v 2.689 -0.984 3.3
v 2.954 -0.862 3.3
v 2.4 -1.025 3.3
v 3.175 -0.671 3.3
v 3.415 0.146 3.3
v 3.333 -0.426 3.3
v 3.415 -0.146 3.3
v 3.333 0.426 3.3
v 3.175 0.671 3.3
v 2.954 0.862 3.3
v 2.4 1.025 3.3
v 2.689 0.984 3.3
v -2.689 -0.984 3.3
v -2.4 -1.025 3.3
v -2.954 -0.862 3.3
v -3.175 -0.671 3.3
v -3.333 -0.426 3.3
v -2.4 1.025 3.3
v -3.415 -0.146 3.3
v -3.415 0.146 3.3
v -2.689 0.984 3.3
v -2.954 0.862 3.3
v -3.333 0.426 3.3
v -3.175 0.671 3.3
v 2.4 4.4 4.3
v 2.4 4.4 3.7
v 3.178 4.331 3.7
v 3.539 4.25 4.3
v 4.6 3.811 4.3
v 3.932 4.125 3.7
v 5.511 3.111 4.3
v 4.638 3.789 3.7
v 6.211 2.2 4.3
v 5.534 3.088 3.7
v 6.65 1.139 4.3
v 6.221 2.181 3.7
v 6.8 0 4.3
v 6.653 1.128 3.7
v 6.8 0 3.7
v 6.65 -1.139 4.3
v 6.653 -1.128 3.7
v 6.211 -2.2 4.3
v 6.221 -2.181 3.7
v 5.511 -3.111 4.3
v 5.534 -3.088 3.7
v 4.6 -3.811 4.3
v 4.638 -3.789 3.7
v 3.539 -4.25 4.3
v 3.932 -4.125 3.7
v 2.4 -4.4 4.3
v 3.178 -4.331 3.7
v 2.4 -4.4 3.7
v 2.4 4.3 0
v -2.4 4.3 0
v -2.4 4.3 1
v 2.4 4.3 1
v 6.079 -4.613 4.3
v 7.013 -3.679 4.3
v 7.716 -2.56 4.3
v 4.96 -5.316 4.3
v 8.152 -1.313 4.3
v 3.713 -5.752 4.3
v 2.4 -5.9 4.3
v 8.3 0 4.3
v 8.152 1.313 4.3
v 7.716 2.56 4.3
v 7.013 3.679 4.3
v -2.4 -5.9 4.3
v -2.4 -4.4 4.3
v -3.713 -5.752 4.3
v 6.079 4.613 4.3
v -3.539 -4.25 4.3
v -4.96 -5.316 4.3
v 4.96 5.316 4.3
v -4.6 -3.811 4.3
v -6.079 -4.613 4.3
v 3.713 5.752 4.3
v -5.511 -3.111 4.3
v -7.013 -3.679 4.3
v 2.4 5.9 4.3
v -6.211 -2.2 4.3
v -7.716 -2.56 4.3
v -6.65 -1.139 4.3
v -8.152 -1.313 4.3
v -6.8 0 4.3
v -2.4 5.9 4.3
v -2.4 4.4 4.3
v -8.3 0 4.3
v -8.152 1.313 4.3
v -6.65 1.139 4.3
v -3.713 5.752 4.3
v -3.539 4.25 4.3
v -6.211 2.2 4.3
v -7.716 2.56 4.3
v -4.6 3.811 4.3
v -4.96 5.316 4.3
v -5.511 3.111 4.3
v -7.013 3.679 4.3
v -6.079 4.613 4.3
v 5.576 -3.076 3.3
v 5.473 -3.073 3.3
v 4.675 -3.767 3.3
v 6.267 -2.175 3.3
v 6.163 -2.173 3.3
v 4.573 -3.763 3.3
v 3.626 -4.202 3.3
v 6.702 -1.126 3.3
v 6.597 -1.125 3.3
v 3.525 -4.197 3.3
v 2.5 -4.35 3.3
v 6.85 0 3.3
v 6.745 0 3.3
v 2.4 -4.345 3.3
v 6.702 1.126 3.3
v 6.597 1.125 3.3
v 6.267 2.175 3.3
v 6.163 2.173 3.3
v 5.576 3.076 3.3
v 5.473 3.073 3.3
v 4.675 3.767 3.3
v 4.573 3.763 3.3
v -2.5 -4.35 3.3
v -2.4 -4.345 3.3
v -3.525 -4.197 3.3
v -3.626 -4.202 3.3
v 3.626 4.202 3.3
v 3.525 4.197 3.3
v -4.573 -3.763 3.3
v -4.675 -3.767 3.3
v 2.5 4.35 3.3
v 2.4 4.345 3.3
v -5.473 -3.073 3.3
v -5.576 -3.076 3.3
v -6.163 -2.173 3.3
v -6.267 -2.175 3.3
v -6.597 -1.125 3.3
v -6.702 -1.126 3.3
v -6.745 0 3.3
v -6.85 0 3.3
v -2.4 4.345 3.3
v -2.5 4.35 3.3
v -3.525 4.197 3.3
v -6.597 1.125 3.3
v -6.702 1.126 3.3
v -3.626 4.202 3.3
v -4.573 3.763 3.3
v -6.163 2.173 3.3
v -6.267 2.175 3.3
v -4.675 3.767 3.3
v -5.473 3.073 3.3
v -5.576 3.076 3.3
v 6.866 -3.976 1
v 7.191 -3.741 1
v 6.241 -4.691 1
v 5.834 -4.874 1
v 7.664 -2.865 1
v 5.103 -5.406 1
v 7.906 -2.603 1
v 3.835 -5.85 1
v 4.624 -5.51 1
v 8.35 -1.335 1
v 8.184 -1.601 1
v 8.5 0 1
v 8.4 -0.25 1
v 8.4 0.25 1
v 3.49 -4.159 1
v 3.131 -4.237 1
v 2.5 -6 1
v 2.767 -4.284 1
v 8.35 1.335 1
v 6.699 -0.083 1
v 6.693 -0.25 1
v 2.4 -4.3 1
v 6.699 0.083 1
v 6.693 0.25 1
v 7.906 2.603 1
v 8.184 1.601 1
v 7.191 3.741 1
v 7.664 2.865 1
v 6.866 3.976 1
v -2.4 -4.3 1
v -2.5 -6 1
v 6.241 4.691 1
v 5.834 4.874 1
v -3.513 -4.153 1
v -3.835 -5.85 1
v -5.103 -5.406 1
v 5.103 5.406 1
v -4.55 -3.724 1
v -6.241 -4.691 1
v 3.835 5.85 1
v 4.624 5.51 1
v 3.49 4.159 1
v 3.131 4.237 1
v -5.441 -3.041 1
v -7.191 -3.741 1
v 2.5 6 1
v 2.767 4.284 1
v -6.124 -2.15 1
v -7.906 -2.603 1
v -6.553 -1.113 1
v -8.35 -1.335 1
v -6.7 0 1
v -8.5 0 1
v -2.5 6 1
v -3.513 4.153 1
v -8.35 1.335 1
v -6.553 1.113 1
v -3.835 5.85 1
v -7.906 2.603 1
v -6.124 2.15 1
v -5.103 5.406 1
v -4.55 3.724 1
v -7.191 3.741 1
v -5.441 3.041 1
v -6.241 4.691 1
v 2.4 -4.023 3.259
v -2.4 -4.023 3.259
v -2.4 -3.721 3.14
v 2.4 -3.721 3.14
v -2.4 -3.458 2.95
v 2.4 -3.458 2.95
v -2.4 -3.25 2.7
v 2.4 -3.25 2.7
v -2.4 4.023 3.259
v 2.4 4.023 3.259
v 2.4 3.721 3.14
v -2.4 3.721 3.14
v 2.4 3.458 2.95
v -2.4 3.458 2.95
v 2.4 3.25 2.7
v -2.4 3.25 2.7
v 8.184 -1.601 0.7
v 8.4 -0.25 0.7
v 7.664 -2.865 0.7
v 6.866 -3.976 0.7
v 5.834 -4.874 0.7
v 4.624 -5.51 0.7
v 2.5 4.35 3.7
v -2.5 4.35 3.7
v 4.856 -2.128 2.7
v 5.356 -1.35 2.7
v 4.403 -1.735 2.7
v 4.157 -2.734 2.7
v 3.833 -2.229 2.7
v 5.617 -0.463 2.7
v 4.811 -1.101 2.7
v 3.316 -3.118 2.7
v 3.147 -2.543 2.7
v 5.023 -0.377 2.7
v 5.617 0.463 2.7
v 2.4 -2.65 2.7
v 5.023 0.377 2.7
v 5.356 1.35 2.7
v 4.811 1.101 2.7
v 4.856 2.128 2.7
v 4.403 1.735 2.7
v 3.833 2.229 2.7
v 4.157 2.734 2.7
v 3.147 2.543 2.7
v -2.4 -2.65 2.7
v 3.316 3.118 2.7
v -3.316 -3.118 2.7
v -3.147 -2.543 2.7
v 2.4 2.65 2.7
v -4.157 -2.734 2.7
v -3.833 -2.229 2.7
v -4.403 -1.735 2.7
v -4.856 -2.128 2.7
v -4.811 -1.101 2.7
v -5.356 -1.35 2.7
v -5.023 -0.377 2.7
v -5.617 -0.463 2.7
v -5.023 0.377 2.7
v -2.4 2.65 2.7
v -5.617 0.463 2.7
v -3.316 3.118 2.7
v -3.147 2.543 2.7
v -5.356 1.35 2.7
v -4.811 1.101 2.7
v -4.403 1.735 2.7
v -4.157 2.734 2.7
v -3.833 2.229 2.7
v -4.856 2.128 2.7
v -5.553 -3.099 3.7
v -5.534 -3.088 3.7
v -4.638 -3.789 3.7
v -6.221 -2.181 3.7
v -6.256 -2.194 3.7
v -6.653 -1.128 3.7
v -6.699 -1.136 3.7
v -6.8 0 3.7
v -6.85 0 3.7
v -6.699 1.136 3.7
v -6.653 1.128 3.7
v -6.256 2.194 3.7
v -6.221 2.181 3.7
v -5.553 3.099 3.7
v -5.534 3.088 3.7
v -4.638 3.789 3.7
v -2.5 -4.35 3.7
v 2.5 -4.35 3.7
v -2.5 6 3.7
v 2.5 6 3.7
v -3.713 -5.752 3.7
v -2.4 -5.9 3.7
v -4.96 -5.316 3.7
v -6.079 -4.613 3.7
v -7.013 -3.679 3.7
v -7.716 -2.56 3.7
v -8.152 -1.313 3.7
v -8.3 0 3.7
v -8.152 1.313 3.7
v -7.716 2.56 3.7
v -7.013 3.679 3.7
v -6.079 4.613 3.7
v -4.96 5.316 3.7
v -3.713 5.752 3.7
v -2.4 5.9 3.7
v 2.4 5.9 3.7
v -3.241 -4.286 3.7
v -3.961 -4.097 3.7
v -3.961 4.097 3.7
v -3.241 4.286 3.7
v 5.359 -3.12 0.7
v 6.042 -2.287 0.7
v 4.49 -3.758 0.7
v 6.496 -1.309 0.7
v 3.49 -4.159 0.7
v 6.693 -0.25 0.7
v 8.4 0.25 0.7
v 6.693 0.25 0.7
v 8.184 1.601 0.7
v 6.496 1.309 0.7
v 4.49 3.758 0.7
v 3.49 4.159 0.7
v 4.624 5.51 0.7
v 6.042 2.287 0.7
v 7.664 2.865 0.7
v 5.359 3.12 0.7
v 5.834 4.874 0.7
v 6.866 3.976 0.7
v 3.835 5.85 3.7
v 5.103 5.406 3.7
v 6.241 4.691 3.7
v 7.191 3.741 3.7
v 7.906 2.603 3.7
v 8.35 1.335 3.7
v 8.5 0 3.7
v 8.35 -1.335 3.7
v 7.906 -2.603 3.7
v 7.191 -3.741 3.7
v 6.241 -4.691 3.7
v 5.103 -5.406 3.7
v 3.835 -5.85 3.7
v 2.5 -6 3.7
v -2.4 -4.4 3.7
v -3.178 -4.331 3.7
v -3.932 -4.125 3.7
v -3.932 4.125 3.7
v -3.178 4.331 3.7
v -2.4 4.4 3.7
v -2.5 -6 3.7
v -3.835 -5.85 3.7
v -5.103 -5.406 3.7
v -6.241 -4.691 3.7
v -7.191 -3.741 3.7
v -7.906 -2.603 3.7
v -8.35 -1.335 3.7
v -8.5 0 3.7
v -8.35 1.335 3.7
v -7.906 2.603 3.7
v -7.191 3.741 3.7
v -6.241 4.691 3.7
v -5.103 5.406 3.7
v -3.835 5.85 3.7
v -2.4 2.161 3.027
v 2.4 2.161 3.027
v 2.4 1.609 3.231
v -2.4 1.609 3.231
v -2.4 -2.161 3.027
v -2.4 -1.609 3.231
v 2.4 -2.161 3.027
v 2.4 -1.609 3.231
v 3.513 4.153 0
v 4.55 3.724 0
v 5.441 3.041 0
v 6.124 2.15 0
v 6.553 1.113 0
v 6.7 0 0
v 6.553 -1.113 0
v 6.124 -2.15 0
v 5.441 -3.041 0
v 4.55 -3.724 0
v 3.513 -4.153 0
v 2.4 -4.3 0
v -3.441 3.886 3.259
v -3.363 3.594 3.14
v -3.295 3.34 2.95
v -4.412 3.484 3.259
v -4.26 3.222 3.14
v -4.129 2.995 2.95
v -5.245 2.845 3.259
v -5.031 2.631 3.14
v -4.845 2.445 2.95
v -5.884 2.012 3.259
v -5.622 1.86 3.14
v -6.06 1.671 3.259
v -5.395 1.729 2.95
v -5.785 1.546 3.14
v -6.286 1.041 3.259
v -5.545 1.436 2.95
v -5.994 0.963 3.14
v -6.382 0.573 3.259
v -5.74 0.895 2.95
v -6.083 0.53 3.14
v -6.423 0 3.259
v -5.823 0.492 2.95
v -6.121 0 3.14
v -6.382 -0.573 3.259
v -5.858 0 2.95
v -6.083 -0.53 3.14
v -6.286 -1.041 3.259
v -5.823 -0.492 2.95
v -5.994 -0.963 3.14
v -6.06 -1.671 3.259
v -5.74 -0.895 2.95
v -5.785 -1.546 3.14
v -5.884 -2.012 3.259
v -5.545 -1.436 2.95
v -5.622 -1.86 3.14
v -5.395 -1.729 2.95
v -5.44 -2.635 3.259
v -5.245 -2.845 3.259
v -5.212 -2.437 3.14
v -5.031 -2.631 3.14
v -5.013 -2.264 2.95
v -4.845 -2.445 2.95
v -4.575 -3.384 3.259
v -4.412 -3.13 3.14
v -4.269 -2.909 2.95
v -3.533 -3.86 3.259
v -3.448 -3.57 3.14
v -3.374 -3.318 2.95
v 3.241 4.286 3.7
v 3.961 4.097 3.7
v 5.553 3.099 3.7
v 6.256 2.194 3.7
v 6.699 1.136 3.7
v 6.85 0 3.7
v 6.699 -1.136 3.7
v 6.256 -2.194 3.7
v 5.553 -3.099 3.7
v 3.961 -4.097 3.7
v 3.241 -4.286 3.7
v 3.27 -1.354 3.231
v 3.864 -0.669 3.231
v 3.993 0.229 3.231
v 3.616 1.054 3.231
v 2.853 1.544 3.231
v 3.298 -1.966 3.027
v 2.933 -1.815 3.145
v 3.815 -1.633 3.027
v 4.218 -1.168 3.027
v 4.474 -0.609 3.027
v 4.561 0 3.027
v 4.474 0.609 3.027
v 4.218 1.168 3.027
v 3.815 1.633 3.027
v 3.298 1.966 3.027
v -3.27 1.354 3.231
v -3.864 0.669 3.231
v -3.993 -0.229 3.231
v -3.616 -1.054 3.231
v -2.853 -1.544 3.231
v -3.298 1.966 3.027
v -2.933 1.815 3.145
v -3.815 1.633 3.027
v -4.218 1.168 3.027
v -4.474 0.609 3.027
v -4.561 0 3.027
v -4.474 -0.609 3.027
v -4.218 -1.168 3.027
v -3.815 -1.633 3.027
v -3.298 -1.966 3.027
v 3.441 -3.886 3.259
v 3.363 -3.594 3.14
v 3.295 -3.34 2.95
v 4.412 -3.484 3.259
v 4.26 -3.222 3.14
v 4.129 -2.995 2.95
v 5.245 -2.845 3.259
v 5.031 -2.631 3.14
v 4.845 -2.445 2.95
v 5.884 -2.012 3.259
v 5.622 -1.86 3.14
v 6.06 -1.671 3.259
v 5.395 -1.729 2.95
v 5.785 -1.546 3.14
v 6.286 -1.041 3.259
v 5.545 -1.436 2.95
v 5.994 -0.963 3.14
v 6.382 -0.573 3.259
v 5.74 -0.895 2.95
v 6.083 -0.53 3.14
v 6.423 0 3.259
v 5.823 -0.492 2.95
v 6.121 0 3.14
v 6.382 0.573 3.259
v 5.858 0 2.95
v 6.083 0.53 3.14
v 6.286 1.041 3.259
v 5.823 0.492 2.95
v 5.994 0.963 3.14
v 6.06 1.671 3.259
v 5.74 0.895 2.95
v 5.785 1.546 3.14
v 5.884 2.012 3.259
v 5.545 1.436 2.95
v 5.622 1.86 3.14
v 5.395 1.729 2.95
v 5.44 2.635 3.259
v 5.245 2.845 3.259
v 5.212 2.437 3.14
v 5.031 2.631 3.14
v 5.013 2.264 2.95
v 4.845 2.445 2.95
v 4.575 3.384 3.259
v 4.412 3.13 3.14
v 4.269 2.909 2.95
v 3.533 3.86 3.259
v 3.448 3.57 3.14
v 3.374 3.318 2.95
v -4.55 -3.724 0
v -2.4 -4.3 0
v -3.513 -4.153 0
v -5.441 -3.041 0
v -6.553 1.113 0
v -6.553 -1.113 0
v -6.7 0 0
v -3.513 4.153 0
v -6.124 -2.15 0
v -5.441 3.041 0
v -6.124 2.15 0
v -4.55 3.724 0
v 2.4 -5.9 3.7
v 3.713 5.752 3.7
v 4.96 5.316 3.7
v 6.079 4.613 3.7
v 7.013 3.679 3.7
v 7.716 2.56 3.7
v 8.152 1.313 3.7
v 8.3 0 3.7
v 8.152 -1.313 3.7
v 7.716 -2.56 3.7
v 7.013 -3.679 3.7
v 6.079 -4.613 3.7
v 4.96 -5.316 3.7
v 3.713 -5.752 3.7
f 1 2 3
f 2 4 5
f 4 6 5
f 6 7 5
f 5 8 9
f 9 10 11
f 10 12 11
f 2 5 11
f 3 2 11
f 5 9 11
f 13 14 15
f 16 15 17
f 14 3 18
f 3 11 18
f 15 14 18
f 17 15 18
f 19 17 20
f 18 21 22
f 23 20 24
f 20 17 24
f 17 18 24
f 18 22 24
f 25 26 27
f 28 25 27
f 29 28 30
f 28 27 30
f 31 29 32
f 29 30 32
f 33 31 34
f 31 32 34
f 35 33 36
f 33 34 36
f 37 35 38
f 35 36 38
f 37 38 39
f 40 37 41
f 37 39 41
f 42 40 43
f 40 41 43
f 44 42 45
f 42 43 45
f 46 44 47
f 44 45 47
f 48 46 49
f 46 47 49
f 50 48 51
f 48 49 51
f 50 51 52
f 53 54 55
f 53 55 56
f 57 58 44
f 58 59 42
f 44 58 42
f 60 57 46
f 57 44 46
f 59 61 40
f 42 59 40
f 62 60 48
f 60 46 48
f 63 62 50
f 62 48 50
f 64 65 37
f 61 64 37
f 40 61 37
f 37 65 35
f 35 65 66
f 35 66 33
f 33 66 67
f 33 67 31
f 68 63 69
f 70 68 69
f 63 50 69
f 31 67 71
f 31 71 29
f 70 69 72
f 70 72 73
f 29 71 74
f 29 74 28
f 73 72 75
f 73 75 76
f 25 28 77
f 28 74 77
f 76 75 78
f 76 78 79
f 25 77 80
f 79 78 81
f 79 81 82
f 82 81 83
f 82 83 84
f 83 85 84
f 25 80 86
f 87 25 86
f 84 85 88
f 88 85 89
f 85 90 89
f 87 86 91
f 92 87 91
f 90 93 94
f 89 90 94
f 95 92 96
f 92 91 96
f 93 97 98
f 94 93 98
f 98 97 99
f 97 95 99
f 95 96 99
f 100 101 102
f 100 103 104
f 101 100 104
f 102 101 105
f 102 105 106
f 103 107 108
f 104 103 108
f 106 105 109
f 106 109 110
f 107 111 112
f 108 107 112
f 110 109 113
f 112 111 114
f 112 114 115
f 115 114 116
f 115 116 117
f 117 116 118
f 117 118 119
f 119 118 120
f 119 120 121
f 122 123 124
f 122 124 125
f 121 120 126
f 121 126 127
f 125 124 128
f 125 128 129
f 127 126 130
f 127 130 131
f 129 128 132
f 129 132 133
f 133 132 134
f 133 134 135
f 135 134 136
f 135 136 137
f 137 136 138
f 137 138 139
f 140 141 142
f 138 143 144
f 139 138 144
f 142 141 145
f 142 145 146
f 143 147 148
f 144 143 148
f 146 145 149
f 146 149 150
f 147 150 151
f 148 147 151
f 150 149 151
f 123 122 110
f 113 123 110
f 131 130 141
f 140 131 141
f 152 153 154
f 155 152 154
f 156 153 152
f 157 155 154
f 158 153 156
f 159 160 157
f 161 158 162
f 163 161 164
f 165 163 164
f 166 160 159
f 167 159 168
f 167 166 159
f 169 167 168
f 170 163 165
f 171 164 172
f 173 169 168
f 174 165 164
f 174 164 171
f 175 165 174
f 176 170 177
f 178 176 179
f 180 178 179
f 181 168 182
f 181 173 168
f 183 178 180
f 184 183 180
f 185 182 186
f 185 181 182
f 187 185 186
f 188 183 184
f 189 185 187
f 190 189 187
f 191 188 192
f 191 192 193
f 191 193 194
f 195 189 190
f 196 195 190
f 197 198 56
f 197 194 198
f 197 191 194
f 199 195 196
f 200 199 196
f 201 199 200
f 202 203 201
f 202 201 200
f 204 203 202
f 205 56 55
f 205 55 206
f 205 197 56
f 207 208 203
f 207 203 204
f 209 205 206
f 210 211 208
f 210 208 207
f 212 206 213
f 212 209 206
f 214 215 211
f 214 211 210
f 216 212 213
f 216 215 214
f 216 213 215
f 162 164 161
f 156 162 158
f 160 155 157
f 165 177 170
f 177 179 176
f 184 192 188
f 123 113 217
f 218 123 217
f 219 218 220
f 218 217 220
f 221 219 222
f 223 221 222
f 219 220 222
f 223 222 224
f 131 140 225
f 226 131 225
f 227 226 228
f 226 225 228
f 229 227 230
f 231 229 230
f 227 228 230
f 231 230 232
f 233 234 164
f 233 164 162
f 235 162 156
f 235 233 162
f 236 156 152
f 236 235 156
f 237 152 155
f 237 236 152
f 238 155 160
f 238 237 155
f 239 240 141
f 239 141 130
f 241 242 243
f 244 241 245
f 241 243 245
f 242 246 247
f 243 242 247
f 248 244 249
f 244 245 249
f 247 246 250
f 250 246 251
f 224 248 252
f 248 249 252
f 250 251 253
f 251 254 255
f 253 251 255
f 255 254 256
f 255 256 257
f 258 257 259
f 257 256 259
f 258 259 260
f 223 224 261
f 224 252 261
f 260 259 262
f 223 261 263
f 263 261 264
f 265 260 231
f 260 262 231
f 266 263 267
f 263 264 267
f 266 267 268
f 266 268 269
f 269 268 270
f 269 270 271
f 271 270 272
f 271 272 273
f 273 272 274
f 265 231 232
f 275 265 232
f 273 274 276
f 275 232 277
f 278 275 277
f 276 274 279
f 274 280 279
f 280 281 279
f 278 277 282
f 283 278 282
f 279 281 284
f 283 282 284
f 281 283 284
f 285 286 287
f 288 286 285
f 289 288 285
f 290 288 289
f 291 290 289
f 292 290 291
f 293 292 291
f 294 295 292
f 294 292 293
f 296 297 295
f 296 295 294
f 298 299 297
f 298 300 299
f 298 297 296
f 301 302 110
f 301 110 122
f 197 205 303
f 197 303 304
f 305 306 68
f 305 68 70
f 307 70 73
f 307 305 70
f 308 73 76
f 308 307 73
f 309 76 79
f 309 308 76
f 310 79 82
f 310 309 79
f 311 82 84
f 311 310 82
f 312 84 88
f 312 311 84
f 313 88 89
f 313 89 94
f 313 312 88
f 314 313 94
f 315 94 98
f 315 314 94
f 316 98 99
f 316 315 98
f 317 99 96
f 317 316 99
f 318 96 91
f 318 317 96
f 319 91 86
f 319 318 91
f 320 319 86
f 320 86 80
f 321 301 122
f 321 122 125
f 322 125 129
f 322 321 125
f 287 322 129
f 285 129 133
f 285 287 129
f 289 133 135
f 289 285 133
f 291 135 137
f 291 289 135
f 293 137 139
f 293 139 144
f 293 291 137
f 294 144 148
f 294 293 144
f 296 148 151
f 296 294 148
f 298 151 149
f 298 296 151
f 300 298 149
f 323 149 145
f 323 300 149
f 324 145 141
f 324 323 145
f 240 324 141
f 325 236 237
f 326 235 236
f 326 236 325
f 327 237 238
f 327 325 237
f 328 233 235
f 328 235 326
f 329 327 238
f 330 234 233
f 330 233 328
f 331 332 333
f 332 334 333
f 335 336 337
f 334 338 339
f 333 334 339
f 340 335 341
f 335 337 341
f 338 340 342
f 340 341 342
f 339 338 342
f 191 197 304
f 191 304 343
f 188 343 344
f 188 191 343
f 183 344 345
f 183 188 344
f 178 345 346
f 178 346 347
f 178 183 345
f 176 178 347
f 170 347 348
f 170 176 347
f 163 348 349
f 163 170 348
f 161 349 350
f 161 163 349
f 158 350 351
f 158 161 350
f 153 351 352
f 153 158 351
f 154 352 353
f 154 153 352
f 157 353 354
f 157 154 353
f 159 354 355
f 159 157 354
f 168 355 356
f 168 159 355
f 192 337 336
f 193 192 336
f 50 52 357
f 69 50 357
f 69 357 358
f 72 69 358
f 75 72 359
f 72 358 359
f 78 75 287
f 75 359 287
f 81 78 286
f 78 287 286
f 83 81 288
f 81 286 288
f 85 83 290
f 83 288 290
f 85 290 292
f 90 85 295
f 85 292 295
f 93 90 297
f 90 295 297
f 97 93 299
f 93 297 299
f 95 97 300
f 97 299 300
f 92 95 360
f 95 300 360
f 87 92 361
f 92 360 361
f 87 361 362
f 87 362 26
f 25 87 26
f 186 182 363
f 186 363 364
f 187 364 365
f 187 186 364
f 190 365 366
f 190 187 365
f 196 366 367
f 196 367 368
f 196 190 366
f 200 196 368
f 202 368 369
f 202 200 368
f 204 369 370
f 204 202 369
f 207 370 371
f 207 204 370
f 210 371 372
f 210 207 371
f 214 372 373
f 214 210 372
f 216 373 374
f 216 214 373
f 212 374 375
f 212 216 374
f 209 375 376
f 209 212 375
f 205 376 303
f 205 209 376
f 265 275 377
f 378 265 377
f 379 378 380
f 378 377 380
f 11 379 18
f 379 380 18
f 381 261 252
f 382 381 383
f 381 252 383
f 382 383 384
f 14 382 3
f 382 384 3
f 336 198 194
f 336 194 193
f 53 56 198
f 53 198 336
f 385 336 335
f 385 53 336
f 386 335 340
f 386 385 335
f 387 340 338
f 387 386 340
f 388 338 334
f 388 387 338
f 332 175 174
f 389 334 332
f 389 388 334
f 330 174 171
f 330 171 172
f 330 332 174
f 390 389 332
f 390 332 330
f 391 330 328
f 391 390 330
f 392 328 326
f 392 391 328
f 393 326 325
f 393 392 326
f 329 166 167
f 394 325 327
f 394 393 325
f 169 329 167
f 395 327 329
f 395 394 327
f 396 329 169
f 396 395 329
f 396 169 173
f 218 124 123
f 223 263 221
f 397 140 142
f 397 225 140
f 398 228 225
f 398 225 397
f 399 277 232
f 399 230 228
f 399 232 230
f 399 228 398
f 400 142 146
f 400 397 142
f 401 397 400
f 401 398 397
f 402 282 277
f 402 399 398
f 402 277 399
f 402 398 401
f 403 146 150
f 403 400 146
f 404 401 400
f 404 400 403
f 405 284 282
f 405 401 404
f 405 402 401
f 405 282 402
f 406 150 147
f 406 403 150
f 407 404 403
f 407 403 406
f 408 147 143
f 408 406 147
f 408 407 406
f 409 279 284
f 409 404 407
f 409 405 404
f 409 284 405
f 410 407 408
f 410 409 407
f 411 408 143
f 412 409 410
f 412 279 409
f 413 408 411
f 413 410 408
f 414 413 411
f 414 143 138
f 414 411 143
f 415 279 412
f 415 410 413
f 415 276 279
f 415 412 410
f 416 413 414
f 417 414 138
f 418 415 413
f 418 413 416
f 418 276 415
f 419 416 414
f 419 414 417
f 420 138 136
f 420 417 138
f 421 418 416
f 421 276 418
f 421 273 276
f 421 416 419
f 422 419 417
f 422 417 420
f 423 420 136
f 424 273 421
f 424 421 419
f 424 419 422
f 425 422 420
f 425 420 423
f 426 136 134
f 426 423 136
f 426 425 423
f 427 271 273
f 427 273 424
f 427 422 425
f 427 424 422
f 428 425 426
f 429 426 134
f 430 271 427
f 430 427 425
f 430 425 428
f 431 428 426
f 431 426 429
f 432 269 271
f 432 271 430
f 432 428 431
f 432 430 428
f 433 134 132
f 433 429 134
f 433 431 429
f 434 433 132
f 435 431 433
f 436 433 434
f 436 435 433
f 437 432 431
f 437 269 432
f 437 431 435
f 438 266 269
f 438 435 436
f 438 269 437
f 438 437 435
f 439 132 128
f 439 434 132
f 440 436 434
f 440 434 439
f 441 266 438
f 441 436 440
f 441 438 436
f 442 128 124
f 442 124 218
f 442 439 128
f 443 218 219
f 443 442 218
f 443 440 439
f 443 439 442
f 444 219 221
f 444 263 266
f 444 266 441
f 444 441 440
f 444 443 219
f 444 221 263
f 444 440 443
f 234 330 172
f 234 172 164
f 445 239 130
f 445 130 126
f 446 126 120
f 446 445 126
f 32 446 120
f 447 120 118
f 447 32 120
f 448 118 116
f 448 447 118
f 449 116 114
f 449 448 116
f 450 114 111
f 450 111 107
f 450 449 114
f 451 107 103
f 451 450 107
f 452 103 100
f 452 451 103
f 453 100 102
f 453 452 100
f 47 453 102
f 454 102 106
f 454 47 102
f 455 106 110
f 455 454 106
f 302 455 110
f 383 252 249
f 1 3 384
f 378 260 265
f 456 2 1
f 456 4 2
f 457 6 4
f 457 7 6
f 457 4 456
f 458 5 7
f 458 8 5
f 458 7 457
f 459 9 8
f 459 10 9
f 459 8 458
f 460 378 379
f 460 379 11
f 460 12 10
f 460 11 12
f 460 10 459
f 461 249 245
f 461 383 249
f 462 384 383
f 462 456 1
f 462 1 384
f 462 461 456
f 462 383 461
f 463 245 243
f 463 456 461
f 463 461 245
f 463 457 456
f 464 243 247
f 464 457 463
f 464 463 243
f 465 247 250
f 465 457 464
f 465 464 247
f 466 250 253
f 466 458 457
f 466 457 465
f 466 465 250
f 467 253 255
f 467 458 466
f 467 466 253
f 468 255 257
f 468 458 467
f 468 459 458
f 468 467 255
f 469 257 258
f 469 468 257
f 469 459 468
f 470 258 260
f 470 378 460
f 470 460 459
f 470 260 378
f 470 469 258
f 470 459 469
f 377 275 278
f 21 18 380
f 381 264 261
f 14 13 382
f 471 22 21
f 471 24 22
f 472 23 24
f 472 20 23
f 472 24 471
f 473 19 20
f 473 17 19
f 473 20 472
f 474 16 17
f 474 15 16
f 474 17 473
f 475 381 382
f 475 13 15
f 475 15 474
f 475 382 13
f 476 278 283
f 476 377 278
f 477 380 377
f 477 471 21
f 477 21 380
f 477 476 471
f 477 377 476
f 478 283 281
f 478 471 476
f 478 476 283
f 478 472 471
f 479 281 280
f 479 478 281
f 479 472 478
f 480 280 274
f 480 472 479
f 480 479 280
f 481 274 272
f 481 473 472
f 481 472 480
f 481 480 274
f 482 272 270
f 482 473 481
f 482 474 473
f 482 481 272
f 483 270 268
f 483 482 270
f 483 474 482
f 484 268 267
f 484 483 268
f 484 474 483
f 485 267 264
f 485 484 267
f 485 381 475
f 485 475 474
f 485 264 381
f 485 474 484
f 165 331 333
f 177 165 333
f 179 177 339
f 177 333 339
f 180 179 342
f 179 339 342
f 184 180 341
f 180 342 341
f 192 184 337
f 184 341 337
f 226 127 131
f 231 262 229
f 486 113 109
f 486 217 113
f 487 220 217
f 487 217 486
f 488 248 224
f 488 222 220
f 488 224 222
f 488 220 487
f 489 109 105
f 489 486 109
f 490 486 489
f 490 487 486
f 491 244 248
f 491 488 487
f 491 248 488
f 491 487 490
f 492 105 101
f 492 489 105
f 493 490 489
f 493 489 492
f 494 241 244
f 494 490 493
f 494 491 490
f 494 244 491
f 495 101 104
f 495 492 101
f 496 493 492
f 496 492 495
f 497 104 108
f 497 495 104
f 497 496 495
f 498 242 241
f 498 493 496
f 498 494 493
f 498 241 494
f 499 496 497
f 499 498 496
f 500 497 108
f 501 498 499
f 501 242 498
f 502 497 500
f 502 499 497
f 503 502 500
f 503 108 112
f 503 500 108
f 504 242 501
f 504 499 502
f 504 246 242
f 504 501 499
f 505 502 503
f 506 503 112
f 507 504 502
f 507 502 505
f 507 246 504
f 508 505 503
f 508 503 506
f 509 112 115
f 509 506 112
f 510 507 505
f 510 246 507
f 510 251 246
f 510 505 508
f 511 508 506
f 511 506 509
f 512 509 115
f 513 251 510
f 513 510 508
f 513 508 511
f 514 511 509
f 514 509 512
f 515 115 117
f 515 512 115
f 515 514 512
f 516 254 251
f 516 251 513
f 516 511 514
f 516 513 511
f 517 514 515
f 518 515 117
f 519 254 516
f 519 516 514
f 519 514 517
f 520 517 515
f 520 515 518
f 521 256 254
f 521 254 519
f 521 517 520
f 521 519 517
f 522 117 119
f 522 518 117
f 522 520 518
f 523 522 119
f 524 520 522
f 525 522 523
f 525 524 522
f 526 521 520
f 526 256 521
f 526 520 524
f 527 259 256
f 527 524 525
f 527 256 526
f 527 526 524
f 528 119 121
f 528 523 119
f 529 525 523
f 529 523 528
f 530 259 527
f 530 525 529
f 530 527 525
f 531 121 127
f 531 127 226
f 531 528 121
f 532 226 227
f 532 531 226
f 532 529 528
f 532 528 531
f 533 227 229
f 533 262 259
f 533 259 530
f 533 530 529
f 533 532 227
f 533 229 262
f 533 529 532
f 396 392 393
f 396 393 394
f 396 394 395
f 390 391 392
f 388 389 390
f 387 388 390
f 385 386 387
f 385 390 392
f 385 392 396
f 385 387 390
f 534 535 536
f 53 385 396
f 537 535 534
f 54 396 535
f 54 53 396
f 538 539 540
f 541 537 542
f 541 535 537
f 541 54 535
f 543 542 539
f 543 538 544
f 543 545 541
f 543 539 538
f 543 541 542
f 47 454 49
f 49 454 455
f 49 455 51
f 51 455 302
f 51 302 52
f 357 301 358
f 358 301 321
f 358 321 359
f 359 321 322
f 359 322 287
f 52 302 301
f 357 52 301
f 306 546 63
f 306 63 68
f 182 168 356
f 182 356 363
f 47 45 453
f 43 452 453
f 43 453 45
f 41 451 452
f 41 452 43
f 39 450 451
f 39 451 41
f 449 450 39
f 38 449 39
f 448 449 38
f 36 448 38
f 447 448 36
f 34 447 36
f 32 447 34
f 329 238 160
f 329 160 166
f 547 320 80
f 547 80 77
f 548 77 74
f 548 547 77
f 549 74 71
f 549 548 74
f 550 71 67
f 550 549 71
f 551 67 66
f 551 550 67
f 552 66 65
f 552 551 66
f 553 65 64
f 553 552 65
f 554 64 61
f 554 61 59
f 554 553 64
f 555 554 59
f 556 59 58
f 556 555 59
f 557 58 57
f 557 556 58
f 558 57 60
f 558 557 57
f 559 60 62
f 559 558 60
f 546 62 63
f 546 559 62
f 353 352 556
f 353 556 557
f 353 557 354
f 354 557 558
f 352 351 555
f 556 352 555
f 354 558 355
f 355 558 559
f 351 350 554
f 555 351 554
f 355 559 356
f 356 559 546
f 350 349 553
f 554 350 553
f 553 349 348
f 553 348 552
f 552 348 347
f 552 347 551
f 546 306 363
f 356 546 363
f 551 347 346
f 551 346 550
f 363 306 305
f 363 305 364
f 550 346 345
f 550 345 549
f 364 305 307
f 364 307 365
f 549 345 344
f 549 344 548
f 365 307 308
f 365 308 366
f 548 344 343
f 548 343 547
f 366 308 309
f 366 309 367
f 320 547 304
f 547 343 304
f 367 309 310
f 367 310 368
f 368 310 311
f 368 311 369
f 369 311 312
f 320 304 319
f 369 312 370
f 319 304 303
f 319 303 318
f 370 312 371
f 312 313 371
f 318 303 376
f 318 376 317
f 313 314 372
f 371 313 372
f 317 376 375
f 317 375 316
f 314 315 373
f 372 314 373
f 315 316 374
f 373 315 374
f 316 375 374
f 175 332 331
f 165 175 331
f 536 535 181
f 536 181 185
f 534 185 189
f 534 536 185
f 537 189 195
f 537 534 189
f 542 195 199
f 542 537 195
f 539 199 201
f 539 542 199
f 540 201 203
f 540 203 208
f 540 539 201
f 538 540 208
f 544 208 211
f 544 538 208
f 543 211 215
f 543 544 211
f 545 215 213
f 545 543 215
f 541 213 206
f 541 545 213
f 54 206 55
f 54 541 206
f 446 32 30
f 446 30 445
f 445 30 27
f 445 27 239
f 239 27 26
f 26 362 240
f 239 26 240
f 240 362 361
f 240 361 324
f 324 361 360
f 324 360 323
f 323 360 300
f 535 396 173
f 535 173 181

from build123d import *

# Parameters (mm, degrees)
EXTRUDE_1_DEPTH     = 1
EXTRUDE_2_DEPTH     = 2.7
EXTRUDE_1_2_DEPTH   = 0.6
CUT_EXTRUDE_1_DEPTH = 1
CUT_EXTRUDE_2_DEPTH = 0.4
FILLET_1_R          = 1.3
FILLET_2_R          = 2.5
EXTRUDE_START       = -0.3
EXTRUDE_3_DEPTH     = 0.3


with BuildPart() as part:
    # Эскиз1 → Extrude 1 (new body)
    with BuildSketch(Plane.XY):
        with BuildLine():
            Line((-2.4, 4.3), (2.4, 4.3))
            ThreePointArc((2.4, 4.3), (6.7, 0), (2.4, -4.3))
            Line((2.4, -4.3), (-2.4, -4.3))
            ThreePointArc((-2.4, -4.3), (-6.7, 0), (-2.4, 4.3))
        make_face()
    extrude(amount=EXTRUDE_1_DEPTH)

    # Эскиз2 → Бобышка-Вытянуть2 (add)
    with BuildSketch(Plane.XY.offset(1)):
        with BuildLine():
            Line((-2.5, 6), (2.5, 6))
            ThreePointArc((2.5, 6), (8.5, 0), (2.5, -6))
            Line((2.5, -6), (-2.5, -6))
            ThreePointArc((-2.5, -6), (-8.5, 0), (-2.5, 6))
        make_face()
    extrude(amount=EXTRUDE_2_DEPTH)

    # Эскиз3 → Extrude 1 2 (add)
    with BuildSketch(Plane.XY.offset(3.7)):
        with BuildLine():
            Line((2.4, -5.9), (-2.4, -5.9))
            ThreePointArc((-2.4, -5.9), (-8.3, 0), (-2.4, 5.9))
            Line((-2.4, 5.9), (2.4, 5.9))
            ThreePointArc((2.4, 5.9), (8.3, 0), (2.4, -5.9))
        make_face()
        with BuildLine():
            Line((2.4, -4.4), (-2.4, -4.4))
            ThreePointArc((-2.4, -4.4), (-6.8, 0), (-2.4, 4.4))
            Line((-2.4, 4.4), (2.4, 4.4))
            ThreePointArc((2.4, 4.4), (6.8, 0), (2.4, -4.4))
        make_face(mode=Mode.SUBTRACT)
    extrude(amount=EXTRUDE_1_2_DEPTH)

    # Эскиз4 → Вырез-Вытянуть1 (cut)
    with BuildSketch(Plane.XY.offset(3.7)):
        with BuildLine():
            Line((-2.4, 3.25), (2.4, 3.25))
            ThreePointArc((2.4, 3.25), (5.65, 0), (2.4, -3.25))
            Line((2.4, -3.25), (-2.4, -3.25))
            ThreePointArc((-2.4, -3.25), (-5.65, 0), (-2.4, 3.25))
        make_face()
        with BuildLine():
            Line((2.4, -2.65), (-2.4, -2.65))
            ThreePointArc((-2.4, -2.65), (-5.05, 0), (-2.4, 2.65))
            Line((-2.4, 2.65), (2.4, 2.65))
            ThreePointArc((2.4, 2.65), (5.05, 0), (2.4, -2.65))
        make_face(mode=Mode.SUBTRACT)
    extrude(amount=-CUT_EXTRUDE_1_DEPTH, mode=Mode.SUBTRACT)

    # Эскиз5 → Вырез-Вытянуть2 (cut)
    with BuildSketch(Plane.XY.offset(3.7)):
        with BuildLine():
            Line((2.5, -4.35), (-2.5, -4.35))
            ThreePointArc((-2.5, -4.35), (-6.85, 0), (-2.5, 4.35))
            Line((-2.5, 4.35), (2.5, 4.35))
            ThreePointArc((2.5, 4.35), (6.85, 0), (2.5, -4.35))
        make_face()
    extrude(amount=-CUT_EXTRUDE_2_DEPTH, mode=Mode.SUBTRACT)

    # Скругление1
    # the kernel refuses this fillet: 1.3 mm, written as the material it takes off along each edge
    with BuildSketch(Plane(origin=(2.4, 0, 3.3), x_dir=(0, -1, 0), z_dir=(-1, 0, 0))) as fillet_1_piece_1:
        with BuildLine():
            CenterArc((4.345445115, -1.3), FILLET_1_R, 90, 57.421029607)
            Line((3.25, -0.6), (3.25, 0))
            Line((3.25, 0), (4.345445115, 0))
        make_face()
    revolve(axis=Axis((2.4, 0, 3.3), (0, 0, 1)), revolution_arc=180, mode=Mode.SUBTRACT)
    with BuildSketch(Plane(origin=(-2.4, 3.25, 3.3), x_dir=(0, 1, 0), z_dir=(1, 0, 0)), Plane(origin=(2.4, -3.25, 3.3), x_dir=(0, -1, 0), z_dir=(-1, 0, 0))) as fillet_1_piece_2:
        with BuildLine():
            CenterArc((1.095445115, -1.3), FILLET_1_R, 90, 57.421029607)
            Line((0, -0.6), (0, 0))
            Line((0, 0), (1.095445115, 0))
        make_face()
    extrude(amount=4.8, mode=Mode.SUBTRACT)
    with BuildSketch(Plane(origin=(-2.4, 0, 3.3), x_dir=(0, 1, 0), z_dir=(1, 0, 0))) as fillet_1_piece_3:
        with BuildLine():
            CenterArc((4.345445115, -1.3), FILLET_1_R, 90, 57.421029607)
            Line((3.25, -0.6), (3.25, 0))
            Line((3.25, 0), (4.345445115, 0))
        make_face()
    revolve(axis=Axis((-2.4, 0, 3.3), (0, 0, 1)), revolution_arc=180, mode=Mode.SUBTRACT)

    # Скругление2
    # the kernel refuses this fillet: 2.5 mm, written as the material it takes off along each edge
    with BuildSketch(Plane(origin=(2.4, 0, 3.3), x_dir=(0, -1, 0), z_dir=(-1, 0, 0))) as fillet_2_piece_1:
        with BuildLine():
            CenterArc((1.025192319, -2.5), FILLET_2_R, 49.464197889, 40.535802111)
            Line((1.025192319, 0), (1.025192319, 0.05))
            Line((1.025192319, 0.05), (2.65, 0.05))
            Line((2.65, 0.05), (2.7, 0))
            ThreePointArc((2.7, 0), (2.7, -0.3), (2.682496154, -0.562))
            Line((2.682496154, -0.562), (2.65, -0.6))
        make_face()
    revolve(axis=Axis((2.4, 0, 3.3), (0, 0, 1)), revolution_arc=180, mode=Mode.SUBTRACT)
    with BuildSketch(Plane(origin=(-2.4, 2.65, 3.3), x_dir=(0, 0, -1), z_dir=(1, 0, 0)), Plane(origin=(2.4, -2.65, 3.3), x_dir=(0, 0, -1), z_dir=(-1, 0, 0))) as fillet_2_piece_2:
        with BuildLine():
            CenterArc((2.5, -1.624807681), FILLET_2_R, 139.464197889, 40.535802111)
            Line((0, -1.624807681), (-0.05, -1.624807681))
            Line((-0.05, -1.624807681), (-0.05, 0))
            Line((-0.05, 0), (0, 0.05))
            ThreePointArc((0, 0.05), (0.3, 0.05), (0.562, 0.032496154))
            Line((0.562, 0.032496154), (0.6, 0))
        make_face()
    extrude(amount=4.8, mode=Mode.SUBTRACT)
    with BuildSketch(Plane(origin=(-2.4, 0, 3.3), x_dir=(0, 1, 0), z_dir=(1, 0, 0))) as fillet_2_piece_3:
        with BuildLine():
            CenterArc((1.025192319, -2.5), FILLET_2_R, 49.464197889, 40.535802111)
            Line((1.025192319, 0), (1.025192319, 0.05))
            Line((1.025192319, 0.05), (2.65, 0.05))
            Line((2.65, 0.05), (2.7, 0))
            ThreePointArc((2.7, 0), (2.7, -0.3), (2.682496154, -0.562))
            Line((2.682496154, -0.562), (2.65, -0.6))
        make_face()
    revolve(axis=Axis((-2.4, 0, 3.3), (0, 0, 1)), revolution_arc=180, mode=Mode.SUBTRACT)

    # Эскиз6 → Бобышка-Вытянуть3 (add)
    with BuildSketch(Plane.XY.offset(1).offset(EXTRUDE_START)):
        with BuildLine():
            Line((6.692726406, 0.25), (8.40002281, 0.25))
            ThreePointArc((8.40002281, 0.25), (7.297123742, 3.443889221), (4.623650475, 5.510252065))
            Line((4.623650475, 5.510252065), (3.490230582, 4.159494835))
            ThreePointArc((3.490230582, 4.159494835), (5.726423597, 2.72486808), (6.692726406, 0.25))
        make_face()
        with BuildLine():
            Line((6.692726406, -0.25), (8.40002281, -0.25))
            ThreePointArc((8.40002281, -0.25), (7.297123742, -3.443889221), (4.623650475, -5.510252065))
            Line((4.623650475, -5.510252065), (3.490230582, -4.159494835))
            ThreePointArc((3.490230582, -4.159494835), (5.726423597, -2.72486808), (6.692726406, -0.25))
        make_face()
    extrude(amount=EXTRUDE_3_DEPTH)


solid = part.part
